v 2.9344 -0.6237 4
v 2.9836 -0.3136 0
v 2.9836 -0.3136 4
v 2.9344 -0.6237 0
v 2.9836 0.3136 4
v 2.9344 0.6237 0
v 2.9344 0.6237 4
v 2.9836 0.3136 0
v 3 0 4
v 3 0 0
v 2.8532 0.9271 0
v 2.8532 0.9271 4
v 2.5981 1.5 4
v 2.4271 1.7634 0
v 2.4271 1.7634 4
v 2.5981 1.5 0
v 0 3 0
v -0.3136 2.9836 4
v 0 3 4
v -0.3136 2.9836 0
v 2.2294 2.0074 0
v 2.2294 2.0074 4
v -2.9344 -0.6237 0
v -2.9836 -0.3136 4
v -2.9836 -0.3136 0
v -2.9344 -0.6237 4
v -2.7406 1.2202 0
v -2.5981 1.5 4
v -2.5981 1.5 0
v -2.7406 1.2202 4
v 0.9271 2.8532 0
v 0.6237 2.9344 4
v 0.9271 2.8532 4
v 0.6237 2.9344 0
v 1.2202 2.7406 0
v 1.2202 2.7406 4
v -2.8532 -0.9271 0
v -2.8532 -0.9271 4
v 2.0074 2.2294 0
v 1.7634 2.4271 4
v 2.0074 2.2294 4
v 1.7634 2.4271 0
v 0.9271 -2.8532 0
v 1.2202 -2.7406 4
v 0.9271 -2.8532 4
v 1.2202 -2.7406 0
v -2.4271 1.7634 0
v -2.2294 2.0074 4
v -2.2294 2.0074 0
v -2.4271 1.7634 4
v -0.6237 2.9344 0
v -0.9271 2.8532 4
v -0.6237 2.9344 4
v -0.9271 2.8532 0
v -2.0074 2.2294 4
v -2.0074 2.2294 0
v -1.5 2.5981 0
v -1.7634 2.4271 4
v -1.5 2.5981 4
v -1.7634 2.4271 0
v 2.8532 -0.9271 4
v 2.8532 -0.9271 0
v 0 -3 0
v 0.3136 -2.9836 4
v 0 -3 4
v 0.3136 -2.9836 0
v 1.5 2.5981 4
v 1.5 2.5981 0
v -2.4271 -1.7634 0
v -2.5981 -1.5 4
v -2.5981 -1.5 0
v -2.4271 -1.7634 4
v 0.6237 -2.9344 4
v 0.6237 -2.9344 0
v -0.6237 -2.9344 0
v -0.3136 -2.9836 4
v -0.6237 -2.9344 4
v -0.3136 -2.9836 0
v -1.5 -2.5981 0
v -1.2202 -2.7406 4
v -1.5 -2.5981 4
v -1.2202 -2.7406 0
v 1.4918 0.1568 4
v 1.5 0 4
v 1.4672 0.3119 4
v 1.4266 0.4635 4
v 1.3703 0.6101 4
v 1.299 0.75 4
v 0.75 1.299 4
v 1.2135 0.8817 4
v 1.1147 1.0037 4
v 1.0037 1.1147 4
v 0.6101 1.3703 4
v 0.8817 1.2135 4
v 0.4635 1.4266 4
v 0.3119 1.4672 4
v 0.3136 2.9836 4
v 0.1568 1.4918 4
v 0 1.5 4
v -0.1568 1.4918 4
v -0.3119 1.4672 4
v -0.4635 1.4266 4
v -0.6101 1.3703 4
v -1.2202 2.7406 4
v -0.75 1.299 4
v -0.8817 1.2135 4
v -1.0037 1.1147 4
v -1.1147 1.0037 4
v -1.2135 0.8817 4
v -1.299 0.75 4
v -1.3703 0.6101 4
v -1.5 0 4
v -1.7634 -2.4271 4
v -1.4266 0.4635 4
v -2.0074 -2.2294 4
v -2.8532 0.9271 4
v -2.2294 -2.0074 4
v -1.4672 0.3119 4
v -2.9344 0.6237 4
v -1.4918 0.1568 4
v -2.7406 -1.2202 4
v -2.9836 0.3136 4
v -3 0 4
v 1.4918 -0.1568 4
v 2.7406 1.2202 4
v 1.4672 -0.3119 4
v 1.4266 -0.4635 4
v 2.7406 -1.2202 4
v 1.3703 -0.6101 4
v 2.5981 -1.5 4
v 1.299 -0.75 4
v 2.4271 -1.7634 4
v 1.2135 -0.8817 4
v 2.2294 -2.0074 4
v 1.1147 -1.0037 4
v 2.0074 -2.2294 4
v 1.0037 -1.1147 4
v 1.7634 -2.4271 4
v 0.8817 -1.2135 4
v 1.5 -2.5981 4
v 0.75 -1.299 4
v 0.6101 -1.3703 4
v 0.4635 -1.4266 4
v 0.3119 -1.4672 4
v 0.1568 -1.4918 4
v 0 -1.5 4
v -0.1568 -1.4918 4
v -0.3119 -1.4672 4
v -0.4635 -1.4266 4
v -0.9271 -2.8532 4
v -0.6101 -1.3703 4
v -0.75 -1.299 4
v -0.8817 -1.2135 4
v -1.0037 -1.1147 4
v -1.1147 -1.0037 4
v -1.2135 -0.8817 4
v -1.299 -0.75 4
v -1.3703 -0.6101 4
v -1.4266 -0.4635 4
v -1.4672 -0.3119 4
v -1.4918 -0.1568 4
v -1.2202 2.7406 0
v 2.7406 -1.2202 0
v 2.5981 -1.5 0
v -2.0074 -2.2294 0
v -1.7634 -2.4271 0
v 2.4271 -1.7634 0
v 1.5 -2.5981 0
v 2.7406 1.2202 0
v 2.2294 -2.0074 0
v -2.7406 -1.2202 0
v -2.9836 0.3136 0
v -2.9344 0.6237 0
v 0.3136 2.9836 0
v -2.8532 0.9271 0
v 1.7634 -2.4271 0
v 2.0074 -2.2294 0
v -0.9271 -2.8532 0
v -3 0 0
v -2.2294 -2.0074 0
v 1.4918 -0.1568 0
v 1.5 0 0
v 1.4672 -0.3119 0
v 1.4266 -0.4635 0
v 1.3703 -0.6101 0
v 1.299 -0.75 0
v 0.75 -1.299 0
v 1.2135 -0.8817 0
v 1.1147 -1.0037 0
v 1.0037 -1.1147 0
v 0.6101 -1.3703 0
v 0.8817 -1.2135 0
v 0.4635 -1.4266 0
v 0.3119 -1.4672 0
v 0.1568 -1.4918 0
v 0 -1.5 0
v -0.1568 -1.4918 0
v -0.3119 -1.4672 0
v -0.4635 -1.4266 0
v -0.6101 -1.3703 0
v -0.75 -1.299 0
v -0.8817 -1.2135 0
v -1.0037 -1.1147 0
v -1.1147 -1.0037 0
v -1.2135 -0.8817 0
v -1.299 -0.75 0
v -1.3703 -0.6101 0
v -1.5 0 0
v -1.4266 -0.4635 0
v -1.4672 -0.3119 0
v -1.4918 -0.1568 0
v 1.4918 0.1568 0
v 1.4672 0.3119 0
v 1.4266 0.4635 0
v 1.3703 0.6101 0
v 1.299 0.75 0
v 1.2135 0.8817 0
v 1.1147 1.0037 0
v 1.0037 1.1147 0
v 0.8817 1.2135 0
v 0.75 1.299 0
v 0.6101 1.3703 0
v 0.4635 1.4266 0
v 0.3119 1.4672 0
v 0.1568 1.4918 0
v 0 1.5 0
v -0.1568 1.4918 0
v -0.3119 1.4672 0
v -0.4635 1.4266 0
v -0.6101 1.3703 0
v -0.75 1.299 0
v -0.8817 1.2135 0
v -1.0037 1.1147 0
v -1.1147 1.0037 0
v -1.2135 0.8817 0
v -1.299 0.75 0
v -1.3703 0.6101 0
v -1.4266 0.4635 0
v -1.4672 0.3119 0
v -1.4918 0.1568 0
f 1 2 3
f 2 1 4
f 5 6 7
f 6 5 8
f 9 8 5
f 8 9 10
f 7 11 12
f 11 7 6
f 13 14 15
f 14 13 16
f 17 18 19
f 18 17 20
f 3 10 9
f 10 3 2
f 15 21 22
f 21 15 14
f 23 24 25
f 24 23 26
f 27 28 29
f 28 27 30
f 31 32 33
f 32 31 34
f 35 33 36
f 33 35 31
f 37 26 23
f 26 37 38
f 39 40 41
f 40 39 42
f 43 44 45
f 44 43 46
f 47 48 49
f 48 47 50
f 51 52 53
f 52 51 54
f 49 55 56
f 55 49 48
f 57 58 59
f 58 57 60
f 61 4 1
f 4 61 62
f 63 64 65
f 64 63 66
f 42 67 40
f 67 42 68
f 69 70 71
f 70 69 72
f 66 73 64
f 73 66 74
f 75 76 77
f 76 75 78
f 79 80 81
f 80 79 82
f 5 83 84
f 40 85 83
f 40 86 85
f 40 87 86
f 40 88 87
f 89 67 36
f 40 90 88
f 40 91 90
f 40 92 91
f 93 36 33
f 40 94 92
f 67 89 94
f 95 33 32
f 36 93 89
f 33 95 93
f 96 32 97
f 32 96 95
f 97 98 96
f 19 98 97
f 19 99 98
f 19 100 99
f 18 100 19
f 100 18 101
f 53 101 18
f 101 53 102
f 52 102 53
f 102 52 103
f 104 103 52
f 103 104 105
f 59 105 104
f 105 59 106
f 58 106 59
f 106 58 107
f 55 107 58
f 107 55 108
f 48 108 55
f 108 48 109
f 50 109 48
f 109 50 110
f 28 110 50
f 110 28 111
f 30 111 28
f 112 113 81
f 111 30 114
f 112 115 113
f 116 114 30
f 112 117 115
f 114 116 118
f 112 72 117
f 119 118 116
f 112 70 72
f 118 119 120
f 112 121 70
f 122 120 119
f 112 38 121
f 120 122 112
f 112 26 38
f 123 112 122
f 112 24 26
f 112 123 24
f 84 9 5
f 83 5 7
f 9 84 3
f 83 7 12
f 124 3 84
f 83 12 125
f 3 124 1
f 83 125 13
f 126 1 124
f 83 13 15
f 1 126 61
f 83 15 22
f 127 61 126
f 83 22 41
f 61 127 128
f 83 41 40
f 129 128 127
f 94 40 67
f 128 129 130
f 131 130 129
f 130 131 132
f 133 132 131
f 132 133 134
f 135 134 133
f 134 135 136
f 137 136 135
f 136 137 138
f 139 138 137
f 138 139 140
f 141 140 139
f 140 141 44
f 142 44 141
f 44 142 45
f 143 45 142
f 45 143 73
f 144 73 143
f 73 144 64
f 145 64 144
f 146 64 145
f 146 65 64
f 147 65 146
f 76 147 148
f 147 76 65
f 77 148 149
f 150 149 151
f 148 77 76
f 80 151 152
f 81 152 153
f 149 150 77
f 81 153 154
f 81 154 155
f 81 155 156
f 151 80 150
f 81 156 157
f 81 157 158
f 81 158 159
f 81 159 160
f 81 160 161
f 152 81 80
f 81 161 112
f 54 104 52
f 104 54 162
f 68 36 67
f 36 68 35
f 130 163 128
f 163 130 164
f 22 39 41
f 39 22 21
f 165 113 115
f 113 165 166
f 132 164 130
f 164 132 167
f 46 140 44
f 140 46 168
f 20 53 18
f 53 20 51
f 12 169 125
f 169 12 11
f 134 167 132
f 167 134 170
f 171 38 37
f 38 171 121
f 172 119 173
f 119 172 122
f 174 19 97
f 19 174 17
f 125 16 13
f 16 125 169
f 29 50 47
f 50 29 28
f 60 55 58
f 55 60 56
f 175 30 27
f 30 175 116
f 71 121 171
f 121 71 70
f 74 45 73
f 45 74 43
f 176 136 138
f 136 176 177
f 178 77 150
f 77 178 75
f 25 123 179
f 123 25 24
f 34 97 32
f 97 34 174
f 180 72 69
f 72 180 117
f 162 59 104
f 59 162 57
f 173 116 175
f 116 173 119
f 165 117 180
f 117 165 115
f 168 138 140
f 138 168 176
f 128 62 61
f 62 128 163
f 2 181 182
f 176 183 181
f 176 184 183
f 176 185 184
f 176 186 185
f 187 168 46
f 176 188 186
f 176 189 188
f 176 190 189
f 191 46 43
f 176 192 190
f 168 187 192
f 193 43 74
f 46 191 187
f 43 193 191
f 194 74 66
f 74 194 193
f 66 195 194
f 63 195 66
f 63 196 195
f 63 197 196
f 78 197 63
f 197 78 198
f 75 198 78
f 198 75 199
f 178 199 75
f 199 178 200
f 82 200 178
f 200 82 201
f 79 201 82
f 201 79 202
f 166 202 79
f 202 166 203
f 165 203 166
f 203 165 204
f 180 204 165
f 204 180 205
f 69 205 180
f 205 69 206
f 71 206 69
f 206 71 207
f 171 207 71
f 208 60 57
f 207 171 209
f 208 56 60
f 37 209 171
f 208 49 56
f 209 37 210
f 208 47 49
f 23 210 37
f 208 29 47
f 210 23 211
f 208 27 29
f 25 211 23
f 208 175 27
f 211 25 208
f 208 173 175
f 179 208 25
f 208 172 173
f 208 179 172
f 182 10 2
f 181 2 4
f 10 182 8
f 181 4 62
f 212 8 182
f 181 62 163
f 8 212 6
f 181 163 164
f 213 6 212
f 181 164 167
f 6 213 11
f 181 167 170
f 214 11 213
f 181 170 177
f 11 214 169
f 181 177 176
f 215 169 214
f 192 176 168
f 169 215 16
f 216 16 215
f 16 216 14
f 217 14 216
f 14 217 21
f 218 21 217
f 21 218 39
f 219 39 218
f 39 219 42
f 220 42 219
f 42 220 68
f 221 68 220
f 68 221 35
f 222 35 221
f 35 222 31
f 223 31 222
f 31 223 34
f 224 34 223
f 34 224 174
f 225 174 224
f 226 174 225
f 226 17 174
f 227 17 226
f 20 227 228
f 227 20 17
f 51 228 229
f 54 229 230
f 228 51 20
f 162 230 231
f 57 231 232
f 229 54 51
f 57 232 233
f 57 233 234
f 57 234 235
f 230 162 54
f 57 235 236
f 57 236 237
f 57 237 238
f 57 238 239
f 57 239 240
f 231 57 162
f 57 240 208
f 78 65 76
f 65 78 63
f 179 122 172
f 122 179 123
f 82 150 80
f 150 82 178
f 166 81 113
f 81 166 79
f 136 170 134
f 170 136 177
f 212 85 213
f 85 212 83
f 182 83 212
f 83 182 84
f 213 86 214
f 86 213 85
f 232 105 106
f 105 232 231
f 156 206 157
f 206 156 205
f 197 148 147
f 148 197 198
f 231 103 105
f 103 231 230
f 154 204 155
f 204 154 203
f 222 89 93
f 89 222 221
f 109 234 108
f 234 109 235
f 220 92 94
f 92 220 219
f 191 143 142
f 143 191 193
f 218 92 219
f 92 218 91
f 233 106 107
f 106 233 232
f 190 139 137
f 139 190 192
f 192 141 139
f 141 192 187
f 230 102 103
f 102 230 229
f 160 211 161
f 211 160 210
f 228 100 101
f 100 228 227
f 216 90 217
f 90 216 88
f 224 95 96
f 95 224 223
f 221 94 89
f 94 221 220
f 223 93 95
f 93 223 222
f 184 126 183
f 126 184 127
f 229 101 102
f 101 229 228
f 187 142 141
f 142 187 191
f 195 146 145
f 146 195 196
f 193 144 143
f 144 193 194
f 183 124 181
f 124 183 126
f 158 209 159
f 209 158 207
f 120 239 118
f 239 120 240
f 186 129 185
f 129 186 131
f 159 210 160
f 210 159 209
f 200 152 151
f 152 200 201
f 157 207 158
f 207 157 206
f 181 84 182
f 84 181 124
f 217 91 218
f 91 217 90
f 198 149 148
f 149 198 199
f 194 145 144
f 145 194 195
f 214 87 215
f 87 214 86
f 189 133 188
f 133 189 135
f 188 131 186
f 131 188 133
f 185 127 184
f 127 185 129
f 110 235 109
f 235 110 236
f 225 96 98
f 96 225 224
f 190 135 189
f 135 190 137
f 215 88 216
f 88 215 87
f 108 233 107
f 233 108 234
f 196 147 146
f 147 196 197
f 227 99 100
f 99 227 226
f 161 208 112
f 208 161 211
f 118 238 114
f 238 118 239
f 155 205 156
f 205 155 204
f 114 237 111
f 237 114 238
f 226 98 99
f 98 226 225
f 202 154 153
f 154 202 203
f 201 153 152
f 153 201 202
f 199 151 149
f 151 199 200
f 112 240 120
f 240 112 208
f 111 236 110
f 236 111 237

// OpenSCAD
// Axle spacer tube.
$fn = 60;
eps = 0.02;
inner_d = 3;
outer_d = 6;
length = 4;
difference() { cylinder(d = outer_d, h = length); translate([0,0,-eps]) cylinder(d = inner_d, h = length + 2 * eps); }
